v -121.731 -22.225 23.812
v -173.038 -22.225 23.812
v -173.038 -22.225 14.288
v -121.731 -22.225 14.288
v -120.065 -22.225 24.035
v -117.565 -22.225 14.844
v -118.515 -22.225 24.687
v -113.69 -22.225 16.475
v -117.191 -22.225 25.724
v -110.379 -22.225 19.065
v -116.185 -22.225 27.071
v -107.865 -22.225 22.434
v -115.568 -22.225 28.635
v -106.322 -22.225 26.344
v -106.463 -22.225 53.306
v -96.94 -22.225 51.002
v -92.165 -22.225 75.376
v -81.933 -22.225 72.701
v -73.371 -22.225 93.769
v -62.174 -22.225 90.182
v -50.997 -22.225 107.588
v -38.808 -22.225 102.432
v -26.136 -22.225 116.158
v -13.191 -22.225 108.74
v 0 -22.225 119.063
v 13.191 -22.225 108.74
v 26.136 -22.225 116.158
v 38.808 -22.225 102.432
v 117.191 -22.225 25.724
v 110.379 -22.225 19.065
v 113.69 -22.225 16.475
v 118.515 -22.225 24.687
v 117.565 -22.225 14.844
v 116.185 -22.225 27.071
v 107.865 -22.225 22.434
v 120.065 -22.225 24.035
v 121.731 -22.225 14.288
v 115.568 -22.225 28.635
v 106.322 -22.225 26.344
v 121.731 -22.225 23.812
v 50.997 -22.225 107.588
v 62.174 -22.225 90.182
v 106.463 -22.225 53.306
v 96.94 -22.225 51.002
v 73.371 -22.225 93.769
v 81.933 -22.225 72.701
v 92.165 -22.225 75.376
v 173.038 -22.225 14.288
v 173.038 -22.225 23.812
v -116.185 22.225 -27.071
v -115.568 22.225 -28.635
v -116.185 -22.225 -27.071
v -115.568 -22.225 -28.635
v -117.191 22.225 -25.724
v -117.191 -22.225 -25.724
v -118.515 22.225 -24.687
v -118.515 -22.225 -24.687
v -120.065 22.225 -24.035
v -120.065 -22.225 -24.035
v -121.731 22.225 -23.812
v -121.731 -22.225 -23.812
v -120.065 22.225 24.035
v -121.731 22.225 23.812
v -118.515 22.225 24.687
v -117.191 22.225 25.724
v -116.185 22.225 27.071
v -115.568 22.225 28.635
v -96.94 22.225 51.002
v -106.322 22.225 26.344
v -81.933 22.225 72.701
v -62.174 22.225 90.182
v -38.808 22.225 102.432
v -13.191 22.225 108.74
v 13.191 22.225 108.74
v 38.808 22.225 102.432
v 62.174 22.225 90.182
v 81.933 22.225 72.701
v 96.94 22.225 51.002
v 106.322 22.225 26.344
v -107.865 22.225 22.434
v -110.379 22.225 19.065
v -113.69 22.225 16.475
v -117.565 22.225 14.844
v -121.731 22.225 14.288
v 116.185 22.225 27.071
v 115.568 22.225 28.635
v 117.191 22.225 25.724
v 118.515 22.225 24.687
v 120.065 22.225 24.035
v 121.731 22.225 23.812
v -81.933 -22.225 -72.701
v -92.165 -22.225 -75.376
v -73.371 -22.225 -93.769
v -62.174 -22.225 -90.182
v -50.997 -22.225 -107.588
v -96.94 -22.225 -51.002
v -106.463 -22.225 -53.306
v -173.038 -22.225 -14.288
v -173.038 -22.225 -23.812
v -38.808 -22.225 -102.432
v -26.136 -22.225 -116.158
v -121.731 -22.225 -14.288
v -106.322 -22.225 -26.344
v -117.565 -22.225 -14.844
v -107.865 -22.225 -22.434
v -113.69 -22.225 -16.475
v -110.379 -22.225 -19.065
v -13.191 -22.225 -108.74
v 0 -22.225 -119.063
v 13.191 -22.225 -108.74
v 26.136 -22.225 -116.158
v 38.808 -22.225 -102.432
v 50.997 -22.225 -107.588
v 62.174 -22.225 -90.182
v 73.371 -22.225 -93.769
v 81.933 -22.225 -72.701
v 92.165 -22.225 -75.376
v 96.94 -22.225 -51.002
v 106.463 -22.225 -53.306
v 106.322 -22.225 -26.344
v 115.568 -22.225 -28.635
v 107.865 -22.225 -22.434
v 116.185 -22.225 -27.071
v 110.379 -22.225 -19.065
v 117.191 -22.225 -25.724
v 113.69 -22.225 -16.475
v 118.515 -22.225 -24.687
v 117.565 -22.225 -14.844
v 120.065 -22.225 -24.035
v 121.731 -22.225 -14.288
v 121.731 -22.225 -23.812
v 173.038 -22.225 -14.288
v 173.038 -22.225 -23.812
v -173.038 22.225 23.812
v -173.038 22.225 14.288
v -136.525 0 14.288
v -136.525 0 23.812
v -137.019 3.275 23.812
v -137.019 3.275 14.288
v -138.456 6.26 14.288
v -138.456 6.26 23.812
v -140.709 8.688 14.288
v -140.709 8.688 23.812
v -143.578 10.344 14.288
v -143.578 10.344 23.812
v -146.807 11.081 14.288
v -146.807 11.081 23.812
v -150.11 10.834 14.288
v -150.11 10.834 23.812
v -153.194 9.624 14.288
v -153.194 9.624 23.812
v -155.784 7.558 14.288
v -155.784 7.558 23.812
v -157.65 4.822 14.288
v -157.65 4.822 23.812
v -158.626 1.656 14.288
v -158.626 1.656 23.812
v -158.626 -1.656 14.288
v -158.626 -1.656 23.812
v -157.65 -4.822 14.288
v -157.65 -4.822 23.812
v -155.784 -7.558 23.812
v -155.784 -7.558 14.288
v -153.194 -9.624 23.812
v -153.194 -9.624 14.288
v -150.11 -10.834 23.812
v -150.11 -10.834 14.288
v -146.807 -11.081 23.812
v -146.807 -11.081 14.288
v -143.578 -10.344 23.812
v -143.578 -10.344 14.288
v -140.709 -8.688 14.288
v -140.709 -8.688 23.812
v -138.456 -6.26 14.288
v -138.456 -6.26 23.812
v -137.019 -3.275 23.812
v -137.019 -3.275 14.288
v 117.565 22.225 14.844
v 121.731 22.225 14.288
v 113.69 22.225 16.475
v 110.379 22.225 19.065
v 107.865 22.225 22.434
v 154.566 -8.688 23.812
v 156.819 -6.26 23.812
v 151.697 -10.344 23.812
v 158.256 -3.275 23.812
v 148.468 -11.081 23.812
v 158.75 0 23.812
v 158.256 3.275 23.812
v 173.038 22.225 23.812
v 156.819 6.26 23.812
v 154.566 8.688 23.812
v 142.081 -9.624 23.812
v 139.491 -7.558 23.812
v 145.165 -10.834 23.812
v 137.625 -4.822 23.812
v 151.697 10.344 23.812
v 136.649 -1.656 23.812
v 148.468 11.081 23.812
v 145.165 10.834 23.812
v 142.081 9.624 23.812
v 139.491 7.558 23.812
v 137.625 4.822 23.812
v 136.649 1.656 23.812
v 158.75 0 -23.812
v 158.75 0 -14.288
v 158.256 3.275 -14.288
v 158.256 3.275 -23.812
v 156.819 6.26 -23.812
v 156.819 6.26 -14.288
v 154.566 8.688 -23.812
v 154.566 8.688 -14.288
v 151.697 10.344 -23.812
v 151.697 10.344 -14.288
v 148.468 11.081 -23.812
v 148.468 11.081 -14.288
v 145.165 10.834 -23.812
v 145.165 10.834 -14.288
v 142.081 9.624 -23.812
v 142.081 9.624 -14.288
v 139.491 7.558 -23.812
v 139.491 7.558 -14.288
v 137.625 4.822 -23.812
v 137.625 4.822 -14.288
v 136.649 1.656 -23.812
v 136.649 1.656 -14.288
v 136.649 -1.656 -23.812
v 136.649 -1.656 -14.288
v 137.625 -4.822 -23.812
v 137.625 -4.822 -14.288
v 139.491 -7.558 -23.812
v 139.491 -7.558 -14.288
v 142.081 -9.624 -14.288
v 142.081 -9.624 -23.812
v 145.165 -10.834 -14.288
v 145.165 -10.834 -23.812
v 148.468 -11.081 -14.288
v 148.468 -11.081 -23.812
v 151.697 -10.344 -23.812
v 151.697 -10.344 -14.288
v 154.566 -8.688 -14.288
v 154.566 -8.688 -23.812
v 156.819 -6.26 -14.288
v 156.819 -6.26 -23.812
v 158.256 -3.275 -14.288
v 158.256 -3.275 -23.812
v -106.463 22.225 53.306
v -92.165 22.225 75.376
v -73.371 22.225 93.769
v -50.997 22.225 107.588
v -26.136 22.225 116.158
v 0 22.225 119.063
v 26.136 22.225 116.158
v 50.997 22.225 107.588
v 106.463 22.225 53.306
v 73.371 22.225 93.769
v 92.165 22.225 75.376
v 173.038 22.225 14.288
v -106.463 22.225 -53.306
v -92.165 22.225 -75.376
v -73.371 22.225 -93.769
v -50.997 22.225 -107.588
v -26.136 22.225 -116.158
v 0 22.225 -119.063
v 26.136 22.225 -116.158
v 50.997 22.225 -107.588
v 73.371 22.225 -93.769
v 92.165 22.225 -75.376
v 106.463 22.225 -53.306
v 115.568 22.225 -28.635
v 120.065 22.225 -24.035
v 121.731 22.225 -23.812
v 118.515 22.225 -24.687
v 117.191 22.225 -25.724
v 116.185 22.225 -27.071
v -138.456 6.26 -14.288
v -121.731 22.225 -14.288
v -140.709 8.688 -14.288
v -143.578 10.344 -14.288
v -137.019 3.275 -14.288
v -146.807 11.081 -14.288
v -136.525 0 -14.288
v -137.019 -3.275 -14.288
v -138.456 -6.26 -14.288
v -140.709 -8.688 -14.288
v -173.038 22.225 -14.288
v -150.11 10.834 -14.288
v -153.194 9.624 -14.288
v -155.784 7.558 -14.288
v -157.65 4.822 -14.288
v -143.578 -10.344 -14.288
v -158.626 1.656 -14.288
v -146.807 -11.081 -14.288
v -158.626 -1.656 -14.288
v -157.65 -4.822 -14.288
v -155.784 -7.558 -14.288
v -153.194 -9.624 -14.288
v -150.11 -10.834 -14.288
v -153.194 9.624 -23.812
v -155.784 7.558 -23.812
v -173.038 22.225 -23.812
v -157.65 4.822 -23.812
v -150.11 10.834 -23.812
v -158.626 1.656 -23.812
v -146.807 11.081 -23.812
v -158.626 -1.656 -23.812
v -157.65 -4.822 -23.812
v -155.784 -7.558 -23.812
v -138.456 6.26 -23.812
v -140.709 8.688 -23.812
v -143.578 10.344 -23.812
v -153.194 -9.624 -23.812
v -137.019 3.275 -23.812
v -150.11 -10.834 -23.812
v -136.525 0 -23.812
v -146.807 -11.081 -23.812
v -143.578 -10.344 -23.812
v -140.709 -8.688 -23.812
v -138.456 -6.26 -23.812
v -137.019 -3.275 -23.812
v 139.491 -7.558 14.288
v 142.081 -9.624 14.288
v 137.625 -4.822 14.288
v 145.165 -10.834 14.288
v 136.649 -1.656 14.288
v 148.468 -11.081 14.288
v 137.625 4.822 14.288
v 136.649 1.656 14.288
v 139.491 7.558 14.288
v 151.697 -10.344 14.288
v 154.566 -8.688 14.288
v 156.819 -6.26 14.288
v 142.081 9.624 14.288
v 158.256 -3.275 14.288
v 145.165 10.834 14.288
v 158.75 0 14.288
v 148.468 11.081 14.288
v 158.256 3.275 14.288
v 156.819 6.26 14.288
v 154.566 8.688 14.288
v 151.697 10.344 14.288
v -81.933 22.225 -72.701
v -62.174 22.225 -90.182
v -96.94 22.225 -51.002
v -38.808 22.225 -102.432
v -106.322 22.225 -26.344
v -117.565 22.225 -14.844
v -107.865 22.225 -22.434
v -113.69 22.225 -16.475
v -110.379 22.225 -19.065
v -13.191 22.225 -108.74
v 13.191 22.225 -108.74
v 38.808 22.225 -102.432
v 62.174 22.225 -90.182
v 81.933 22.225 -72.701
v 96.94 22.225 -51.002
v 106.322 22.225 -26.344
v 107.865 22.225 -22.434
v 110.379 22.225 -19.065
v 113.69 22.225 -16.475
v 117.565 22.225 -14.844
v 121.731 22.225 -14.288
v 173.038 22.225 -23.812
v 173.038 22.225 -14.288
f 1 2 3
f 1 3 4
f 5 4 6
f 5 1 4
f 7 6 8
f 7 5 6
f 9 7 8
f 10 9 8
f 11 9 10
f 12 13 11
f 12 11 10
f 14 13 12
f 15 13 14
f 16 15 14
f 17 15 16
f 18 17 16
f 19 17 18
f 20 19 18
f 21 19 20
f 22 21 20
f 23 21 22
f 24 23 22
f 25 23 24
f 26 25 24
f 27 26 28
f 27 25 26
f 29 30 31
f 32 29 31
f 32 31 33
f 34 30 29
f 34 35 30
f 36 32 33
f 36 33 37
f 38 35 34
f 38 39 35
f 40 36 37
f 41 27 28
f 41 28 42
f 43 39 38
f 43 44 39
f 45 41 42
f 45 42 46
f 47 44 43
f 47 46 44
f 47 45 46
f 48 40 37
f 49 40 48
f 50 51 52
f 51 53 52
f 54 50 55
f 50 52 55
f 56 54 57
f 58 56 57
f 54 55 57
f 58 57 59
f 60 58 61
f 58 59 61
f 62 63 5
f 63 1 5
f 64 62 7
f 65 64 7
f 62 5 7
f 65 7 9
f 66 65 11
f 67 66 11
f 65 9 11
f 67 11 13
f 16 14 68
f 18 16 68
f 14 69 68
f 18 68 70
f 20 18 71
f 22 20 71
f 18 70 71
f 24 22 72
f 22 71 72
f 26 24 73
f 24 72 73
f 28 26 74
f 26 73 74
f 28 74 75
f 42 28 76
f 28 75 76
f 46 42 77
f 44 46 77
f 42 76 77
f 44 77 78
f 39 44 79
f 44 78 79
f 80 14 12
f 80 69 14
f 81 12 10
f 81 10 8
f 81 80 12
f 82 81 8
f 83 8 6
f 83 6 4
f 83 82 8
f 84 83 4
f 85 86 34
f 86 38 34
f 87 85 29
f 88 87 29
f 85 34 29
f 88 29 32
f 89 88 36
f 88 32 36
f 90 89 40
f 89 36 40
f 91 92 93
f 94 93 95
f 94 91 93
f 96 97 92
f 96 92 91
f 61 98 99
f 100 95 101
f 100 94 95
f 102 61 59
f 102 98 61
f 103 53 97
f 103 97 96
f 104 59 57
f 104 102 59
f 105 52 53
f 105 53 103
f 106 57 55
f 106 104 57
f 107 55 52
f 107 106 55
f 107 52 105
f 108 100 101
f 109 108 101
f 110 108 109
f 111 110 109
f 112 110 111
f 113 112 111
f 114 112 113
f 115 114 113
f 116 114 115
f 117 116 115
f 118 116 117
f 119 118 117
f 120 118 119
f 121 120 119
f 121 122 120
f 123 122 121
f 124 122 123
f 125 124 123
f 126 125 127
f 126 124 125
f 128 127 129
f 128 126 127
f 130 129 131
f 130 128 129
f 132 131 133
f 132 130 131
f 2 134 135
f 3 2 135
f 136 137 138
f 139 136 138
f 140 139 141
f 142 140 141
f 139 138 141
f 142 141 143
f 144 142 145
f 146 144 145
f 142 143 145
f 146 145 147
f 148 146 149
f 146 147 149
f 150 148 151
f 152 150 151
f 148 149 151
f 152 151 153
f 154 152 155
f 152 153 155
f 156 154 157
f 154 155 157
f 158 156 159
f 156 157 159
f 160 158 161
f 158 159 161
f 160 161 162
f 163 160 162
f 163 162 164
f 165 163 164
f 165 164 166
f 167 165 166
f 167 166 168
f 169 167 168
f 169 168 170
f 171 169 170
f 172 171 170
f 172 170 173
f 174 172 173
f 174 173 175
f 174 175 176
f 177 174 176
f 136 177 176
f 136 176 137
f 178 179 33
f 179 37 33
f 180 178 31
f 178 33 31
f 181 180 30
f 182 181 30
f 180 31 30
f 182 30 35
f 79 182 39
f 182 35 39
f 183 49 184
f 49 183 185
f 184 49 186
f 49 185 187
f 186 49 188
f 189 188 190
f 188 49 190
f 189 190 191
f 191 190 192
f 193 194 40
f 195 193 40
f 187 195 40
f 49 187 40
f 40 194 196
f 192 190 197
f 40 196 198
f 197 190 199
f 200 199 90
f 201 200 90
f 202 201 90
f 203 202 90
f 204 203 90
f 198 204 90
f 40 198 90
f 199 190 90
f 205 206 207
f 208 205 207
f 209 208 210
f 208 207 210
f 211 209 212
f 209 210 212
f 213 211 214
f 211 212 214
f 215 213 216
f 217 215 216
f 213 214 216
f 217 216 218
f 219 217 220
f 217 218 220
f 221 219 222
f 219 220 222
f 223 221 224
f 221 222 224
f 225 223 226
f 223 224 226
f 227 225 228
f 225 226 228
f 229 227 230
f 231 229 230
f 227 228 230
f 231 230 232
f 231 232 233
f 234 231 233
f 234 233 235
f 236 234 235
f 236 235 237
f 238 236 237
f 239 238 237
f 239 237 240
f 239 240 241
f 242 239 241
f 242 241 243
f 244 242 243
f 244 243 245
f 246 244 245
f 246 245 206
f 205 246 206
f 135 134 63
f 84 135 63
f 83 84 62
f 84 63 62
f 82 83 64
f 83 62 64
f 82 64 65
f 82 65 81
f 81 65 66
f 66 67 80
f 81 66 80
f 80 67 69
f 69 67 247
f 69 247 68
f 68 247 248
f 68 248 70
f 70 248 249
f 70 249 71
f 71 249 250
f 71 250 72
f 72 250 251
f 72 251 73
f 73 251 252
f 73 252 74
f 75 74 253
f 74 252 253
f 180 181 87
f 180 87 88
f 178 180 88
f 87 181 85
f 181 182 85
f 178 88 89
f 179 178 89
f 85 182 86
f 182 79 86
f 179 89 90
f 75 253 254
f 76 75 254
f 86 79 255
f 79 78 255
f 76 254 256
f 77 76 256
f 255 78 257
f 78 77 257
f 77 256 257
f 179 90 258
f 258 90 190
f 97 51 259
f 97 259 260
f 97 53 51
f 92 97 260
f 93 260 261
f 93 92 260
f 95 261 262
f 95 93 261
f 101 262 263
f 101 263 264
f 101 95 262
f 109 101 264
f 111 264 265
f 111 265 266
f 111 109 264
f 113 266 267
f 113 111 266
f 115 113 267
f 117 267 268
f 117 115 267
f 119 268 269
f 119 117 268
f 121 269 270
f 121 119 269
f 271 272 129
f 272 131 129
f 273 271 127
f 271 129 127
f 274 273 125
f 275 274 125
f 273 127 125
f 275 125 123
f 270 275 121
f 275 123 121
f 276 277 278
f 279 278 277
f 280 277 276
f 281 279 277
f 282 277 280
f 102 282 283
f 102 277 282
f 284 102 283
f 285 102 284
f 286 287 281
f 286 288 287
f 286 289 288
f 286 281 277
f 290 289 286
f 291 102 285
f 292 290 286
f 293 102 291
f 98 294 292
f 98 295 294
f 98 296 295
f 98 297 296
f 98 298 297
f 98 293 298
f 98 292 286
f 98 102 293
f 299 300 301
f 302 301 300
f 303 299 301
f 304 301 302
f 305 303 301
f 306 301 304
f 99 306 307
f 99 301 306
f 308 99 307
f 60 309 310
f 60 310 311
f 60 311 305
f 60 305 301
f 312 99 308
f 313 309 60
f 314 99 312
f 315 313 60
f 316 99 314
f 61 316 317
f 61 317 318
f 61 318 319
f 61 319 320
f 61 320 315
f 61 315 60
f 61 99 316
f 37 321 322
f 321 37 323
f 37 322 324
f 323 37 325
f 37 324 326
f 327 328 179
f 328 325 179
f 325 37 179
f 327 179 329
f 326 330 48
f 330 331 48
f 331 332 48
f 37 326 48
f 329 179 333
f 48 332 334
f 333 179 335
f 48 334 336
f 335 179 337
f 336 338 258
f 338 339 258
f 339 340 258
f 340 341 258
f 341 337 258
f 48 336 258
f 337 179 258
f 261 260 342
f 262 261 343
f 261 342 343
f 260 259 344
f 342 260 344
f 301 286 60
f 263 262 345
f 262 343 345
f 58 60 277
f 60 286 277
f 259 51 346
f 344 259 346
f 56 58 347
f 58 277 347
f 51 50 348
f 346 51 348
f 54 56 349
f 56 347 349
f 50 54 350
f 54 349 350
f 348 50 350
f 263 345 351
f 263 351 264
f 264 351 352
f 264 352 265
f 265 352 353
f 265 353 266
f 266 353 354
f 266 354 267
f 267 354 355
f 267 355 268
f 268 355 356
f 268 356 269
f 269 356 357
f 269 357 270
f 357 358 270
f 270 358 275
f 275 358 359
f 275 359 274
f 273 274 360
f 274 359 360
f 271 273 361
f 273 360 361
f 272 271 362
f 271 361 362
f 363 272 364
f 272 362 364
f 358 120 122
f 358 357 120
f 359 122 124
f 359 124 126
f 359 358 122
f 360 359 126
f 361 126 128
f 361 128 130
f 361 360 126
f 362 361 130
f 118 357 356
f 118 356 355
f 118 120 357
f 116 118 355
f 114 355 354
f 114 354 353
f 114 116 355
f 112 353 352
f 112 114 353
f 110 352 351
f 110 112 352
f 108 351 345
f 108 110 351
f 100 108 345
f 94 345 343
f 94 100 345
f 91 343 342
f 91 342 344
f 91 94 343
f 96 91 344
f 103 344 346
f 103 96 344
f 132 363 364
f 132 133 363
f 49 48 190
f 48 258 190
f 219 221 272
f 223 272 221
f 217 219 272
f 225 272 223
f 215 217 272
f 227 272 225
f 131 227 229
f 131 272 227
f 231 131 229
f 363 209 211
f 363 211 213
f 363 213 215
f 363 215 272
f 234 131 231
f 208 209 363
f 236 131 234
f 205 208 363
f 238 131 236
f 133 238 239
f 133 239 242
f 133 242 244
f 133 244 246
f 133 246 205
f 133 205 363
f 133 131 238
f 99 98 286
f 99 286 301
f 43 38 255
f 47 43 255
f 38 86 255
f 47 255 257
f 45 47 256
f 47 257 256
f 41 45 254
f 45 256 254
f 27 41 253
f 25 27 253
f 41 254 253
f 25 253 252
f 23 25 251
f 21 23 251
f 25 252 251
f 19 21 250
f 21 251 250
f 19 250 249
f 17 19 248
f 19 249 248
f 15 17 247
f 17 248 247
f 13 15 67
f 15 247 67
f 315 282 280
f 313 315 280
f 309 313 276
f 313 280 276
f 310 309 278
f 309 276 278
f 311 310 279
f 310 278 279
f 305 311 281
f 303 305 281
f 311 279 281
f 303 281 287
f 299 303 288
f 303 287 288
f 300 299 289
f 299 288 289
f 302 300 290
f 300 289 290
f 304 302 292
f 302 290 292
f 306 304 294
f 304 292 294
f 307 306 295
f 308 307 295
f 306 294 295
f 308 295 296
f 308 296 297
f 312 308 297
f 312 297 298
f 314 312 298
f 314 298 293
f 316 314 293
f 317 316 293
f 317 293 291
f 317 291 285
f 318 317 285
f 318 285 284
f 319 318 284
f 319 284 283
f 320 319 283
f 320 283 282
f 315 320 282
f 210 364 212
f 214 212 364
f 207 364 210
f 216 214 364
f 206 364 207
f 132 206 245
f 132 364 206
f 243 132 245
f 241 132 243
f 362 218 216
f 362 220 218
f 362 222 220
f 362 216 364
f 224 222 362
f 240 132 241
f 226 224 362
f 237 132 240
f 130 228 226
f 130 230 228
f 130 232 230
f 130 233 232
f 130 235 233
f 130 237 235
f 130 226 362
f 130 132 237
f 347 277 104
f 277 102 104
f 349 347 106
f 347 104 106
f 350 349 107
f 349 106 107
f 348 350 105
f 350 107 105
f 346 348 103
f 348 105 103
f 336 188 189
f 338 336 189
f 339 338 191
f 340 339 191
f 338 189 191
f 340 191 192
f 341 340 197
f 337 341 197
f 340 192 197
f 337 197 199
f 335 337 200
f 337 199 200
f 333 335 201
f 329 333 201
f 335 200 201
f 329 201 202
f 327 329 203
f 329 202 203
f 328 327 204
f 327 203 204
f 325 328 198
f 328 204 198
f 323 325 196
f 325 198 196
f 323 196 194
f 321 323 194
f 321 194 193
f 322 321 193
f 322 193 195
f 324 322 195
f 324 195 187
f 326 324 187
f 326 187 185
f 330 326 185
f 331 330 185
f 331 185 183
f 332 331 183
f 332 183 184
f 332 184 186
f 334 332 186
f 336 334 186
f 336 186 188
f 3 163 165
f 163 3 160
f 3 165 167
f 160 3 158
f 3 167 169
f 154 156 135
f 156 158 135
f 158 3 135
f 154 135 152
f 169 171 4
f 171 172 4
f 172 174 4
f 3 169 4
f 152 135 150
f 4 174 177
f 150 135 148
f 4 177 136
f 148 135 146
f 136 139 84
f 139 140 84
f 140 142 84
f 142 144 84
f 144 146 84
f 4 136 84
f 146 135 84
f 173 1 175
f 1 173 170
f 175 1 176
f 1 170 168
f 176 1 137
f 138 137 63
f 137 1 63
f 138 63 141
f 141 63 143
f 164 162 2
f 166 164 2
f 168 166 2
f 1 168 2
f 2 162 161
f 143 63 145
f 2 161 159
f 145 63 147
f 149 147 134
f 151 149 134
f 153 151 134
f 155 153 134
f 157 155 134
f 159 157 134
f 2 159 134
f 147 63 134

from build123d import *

# Parameters (mm, degrees)
F1_DEPTH = 22.225
F2_R     = 6.35
F3_R     = 15.875
F4_R     = 11.1125
F5_DEPTH = 142.876


with BuildPart() as f1:
    # F0 (on Front) → F1 (new body, symmetric)
    with BuildSketch(Plane.XZ):
        with BuildLine():
            ThreePointArc((-108.601709, 14.2875), (0, 109.5375), (108.601709, 14.2875))
            Line((108.601709, 14.2875), (173.0375, 14.2875))
            Line((173.0375, 14.2875), (173.0375, 23.8125))
            Line((173.0375, 23.8125), (116.656949, 23.8125))
            ThreePointArc((116.656949, 23.8125), (0, 119.0625), (-116.656949, 23.8125))
            Line((-116.656949, 23.8125), (-173.0375, 23.8125))
            Line((-173.0375, 23.8125), (-173.0375, 14.2875))
            Line((-173.0375, 14.2875), (-108.601709, 14.2875))
        make_face()
        with BuildLine():
            ThreePointArc((108.601709, -14.2875), (0, -109.5375), (-108.601709, -14.2875))
            Line((-108.601709, -14.2875), (-173.0375, -14.2875))
            Line((-173.0375, -14.2875), (-173.0375, -23.8125))
            Line((-173.0375, -23.8125), (-116.656949, -23.8125))
            ThreePointArc((-116.656949, -23.8125), (0, -119.0625), (116.656949, -23.8125))
            Line((116.656949, -23.8125), (173.0375, -23.8125))
            Line((173.0375, -23.8125), (173.0375, -14.2875))
            Line((173.0375, -14.2875), (108.601709, -14.2875))
        make_face()
    extrude(amount=F1_DEPTH, both=True)

    # F2
    f2_edges = [f1.edges().sort_by_distance(p)[0] for p in [
        (-116.656949, 0, 23.8125),
        (116.656949, 0, 23.8125),
        (116.656949, 0, -23.8125),
        (-116.656949, 0, -23.8125),
    ]]
    fillet(f2_edges, radius=F2_R)

    # F3
    f3_edges = [f1.edges().sort_by_distance(p)[0] for p in [
        (108.601709, 0, 14.2875),
        (108.601709, 0, -14.2875),
        (-108.601709, 0, -14.2875),
        (-108.601709, 0, 14.2875),
    ]]
    fillet(f3_edges, radius=F3_R)

    # F4 (on face) → F5 (cut, through all)
    with BuildSketch(Plane.XY.offset(23.8125)):
        with Locations((-147.6375, 0)):
            Circle(F4_R)
        with Locations((147.6375, 0)):
            Circle(F4_R)
    extrude(amount=-F5_DEPTH, mode=Mode.SUBTRACT)


solid = f1.part
